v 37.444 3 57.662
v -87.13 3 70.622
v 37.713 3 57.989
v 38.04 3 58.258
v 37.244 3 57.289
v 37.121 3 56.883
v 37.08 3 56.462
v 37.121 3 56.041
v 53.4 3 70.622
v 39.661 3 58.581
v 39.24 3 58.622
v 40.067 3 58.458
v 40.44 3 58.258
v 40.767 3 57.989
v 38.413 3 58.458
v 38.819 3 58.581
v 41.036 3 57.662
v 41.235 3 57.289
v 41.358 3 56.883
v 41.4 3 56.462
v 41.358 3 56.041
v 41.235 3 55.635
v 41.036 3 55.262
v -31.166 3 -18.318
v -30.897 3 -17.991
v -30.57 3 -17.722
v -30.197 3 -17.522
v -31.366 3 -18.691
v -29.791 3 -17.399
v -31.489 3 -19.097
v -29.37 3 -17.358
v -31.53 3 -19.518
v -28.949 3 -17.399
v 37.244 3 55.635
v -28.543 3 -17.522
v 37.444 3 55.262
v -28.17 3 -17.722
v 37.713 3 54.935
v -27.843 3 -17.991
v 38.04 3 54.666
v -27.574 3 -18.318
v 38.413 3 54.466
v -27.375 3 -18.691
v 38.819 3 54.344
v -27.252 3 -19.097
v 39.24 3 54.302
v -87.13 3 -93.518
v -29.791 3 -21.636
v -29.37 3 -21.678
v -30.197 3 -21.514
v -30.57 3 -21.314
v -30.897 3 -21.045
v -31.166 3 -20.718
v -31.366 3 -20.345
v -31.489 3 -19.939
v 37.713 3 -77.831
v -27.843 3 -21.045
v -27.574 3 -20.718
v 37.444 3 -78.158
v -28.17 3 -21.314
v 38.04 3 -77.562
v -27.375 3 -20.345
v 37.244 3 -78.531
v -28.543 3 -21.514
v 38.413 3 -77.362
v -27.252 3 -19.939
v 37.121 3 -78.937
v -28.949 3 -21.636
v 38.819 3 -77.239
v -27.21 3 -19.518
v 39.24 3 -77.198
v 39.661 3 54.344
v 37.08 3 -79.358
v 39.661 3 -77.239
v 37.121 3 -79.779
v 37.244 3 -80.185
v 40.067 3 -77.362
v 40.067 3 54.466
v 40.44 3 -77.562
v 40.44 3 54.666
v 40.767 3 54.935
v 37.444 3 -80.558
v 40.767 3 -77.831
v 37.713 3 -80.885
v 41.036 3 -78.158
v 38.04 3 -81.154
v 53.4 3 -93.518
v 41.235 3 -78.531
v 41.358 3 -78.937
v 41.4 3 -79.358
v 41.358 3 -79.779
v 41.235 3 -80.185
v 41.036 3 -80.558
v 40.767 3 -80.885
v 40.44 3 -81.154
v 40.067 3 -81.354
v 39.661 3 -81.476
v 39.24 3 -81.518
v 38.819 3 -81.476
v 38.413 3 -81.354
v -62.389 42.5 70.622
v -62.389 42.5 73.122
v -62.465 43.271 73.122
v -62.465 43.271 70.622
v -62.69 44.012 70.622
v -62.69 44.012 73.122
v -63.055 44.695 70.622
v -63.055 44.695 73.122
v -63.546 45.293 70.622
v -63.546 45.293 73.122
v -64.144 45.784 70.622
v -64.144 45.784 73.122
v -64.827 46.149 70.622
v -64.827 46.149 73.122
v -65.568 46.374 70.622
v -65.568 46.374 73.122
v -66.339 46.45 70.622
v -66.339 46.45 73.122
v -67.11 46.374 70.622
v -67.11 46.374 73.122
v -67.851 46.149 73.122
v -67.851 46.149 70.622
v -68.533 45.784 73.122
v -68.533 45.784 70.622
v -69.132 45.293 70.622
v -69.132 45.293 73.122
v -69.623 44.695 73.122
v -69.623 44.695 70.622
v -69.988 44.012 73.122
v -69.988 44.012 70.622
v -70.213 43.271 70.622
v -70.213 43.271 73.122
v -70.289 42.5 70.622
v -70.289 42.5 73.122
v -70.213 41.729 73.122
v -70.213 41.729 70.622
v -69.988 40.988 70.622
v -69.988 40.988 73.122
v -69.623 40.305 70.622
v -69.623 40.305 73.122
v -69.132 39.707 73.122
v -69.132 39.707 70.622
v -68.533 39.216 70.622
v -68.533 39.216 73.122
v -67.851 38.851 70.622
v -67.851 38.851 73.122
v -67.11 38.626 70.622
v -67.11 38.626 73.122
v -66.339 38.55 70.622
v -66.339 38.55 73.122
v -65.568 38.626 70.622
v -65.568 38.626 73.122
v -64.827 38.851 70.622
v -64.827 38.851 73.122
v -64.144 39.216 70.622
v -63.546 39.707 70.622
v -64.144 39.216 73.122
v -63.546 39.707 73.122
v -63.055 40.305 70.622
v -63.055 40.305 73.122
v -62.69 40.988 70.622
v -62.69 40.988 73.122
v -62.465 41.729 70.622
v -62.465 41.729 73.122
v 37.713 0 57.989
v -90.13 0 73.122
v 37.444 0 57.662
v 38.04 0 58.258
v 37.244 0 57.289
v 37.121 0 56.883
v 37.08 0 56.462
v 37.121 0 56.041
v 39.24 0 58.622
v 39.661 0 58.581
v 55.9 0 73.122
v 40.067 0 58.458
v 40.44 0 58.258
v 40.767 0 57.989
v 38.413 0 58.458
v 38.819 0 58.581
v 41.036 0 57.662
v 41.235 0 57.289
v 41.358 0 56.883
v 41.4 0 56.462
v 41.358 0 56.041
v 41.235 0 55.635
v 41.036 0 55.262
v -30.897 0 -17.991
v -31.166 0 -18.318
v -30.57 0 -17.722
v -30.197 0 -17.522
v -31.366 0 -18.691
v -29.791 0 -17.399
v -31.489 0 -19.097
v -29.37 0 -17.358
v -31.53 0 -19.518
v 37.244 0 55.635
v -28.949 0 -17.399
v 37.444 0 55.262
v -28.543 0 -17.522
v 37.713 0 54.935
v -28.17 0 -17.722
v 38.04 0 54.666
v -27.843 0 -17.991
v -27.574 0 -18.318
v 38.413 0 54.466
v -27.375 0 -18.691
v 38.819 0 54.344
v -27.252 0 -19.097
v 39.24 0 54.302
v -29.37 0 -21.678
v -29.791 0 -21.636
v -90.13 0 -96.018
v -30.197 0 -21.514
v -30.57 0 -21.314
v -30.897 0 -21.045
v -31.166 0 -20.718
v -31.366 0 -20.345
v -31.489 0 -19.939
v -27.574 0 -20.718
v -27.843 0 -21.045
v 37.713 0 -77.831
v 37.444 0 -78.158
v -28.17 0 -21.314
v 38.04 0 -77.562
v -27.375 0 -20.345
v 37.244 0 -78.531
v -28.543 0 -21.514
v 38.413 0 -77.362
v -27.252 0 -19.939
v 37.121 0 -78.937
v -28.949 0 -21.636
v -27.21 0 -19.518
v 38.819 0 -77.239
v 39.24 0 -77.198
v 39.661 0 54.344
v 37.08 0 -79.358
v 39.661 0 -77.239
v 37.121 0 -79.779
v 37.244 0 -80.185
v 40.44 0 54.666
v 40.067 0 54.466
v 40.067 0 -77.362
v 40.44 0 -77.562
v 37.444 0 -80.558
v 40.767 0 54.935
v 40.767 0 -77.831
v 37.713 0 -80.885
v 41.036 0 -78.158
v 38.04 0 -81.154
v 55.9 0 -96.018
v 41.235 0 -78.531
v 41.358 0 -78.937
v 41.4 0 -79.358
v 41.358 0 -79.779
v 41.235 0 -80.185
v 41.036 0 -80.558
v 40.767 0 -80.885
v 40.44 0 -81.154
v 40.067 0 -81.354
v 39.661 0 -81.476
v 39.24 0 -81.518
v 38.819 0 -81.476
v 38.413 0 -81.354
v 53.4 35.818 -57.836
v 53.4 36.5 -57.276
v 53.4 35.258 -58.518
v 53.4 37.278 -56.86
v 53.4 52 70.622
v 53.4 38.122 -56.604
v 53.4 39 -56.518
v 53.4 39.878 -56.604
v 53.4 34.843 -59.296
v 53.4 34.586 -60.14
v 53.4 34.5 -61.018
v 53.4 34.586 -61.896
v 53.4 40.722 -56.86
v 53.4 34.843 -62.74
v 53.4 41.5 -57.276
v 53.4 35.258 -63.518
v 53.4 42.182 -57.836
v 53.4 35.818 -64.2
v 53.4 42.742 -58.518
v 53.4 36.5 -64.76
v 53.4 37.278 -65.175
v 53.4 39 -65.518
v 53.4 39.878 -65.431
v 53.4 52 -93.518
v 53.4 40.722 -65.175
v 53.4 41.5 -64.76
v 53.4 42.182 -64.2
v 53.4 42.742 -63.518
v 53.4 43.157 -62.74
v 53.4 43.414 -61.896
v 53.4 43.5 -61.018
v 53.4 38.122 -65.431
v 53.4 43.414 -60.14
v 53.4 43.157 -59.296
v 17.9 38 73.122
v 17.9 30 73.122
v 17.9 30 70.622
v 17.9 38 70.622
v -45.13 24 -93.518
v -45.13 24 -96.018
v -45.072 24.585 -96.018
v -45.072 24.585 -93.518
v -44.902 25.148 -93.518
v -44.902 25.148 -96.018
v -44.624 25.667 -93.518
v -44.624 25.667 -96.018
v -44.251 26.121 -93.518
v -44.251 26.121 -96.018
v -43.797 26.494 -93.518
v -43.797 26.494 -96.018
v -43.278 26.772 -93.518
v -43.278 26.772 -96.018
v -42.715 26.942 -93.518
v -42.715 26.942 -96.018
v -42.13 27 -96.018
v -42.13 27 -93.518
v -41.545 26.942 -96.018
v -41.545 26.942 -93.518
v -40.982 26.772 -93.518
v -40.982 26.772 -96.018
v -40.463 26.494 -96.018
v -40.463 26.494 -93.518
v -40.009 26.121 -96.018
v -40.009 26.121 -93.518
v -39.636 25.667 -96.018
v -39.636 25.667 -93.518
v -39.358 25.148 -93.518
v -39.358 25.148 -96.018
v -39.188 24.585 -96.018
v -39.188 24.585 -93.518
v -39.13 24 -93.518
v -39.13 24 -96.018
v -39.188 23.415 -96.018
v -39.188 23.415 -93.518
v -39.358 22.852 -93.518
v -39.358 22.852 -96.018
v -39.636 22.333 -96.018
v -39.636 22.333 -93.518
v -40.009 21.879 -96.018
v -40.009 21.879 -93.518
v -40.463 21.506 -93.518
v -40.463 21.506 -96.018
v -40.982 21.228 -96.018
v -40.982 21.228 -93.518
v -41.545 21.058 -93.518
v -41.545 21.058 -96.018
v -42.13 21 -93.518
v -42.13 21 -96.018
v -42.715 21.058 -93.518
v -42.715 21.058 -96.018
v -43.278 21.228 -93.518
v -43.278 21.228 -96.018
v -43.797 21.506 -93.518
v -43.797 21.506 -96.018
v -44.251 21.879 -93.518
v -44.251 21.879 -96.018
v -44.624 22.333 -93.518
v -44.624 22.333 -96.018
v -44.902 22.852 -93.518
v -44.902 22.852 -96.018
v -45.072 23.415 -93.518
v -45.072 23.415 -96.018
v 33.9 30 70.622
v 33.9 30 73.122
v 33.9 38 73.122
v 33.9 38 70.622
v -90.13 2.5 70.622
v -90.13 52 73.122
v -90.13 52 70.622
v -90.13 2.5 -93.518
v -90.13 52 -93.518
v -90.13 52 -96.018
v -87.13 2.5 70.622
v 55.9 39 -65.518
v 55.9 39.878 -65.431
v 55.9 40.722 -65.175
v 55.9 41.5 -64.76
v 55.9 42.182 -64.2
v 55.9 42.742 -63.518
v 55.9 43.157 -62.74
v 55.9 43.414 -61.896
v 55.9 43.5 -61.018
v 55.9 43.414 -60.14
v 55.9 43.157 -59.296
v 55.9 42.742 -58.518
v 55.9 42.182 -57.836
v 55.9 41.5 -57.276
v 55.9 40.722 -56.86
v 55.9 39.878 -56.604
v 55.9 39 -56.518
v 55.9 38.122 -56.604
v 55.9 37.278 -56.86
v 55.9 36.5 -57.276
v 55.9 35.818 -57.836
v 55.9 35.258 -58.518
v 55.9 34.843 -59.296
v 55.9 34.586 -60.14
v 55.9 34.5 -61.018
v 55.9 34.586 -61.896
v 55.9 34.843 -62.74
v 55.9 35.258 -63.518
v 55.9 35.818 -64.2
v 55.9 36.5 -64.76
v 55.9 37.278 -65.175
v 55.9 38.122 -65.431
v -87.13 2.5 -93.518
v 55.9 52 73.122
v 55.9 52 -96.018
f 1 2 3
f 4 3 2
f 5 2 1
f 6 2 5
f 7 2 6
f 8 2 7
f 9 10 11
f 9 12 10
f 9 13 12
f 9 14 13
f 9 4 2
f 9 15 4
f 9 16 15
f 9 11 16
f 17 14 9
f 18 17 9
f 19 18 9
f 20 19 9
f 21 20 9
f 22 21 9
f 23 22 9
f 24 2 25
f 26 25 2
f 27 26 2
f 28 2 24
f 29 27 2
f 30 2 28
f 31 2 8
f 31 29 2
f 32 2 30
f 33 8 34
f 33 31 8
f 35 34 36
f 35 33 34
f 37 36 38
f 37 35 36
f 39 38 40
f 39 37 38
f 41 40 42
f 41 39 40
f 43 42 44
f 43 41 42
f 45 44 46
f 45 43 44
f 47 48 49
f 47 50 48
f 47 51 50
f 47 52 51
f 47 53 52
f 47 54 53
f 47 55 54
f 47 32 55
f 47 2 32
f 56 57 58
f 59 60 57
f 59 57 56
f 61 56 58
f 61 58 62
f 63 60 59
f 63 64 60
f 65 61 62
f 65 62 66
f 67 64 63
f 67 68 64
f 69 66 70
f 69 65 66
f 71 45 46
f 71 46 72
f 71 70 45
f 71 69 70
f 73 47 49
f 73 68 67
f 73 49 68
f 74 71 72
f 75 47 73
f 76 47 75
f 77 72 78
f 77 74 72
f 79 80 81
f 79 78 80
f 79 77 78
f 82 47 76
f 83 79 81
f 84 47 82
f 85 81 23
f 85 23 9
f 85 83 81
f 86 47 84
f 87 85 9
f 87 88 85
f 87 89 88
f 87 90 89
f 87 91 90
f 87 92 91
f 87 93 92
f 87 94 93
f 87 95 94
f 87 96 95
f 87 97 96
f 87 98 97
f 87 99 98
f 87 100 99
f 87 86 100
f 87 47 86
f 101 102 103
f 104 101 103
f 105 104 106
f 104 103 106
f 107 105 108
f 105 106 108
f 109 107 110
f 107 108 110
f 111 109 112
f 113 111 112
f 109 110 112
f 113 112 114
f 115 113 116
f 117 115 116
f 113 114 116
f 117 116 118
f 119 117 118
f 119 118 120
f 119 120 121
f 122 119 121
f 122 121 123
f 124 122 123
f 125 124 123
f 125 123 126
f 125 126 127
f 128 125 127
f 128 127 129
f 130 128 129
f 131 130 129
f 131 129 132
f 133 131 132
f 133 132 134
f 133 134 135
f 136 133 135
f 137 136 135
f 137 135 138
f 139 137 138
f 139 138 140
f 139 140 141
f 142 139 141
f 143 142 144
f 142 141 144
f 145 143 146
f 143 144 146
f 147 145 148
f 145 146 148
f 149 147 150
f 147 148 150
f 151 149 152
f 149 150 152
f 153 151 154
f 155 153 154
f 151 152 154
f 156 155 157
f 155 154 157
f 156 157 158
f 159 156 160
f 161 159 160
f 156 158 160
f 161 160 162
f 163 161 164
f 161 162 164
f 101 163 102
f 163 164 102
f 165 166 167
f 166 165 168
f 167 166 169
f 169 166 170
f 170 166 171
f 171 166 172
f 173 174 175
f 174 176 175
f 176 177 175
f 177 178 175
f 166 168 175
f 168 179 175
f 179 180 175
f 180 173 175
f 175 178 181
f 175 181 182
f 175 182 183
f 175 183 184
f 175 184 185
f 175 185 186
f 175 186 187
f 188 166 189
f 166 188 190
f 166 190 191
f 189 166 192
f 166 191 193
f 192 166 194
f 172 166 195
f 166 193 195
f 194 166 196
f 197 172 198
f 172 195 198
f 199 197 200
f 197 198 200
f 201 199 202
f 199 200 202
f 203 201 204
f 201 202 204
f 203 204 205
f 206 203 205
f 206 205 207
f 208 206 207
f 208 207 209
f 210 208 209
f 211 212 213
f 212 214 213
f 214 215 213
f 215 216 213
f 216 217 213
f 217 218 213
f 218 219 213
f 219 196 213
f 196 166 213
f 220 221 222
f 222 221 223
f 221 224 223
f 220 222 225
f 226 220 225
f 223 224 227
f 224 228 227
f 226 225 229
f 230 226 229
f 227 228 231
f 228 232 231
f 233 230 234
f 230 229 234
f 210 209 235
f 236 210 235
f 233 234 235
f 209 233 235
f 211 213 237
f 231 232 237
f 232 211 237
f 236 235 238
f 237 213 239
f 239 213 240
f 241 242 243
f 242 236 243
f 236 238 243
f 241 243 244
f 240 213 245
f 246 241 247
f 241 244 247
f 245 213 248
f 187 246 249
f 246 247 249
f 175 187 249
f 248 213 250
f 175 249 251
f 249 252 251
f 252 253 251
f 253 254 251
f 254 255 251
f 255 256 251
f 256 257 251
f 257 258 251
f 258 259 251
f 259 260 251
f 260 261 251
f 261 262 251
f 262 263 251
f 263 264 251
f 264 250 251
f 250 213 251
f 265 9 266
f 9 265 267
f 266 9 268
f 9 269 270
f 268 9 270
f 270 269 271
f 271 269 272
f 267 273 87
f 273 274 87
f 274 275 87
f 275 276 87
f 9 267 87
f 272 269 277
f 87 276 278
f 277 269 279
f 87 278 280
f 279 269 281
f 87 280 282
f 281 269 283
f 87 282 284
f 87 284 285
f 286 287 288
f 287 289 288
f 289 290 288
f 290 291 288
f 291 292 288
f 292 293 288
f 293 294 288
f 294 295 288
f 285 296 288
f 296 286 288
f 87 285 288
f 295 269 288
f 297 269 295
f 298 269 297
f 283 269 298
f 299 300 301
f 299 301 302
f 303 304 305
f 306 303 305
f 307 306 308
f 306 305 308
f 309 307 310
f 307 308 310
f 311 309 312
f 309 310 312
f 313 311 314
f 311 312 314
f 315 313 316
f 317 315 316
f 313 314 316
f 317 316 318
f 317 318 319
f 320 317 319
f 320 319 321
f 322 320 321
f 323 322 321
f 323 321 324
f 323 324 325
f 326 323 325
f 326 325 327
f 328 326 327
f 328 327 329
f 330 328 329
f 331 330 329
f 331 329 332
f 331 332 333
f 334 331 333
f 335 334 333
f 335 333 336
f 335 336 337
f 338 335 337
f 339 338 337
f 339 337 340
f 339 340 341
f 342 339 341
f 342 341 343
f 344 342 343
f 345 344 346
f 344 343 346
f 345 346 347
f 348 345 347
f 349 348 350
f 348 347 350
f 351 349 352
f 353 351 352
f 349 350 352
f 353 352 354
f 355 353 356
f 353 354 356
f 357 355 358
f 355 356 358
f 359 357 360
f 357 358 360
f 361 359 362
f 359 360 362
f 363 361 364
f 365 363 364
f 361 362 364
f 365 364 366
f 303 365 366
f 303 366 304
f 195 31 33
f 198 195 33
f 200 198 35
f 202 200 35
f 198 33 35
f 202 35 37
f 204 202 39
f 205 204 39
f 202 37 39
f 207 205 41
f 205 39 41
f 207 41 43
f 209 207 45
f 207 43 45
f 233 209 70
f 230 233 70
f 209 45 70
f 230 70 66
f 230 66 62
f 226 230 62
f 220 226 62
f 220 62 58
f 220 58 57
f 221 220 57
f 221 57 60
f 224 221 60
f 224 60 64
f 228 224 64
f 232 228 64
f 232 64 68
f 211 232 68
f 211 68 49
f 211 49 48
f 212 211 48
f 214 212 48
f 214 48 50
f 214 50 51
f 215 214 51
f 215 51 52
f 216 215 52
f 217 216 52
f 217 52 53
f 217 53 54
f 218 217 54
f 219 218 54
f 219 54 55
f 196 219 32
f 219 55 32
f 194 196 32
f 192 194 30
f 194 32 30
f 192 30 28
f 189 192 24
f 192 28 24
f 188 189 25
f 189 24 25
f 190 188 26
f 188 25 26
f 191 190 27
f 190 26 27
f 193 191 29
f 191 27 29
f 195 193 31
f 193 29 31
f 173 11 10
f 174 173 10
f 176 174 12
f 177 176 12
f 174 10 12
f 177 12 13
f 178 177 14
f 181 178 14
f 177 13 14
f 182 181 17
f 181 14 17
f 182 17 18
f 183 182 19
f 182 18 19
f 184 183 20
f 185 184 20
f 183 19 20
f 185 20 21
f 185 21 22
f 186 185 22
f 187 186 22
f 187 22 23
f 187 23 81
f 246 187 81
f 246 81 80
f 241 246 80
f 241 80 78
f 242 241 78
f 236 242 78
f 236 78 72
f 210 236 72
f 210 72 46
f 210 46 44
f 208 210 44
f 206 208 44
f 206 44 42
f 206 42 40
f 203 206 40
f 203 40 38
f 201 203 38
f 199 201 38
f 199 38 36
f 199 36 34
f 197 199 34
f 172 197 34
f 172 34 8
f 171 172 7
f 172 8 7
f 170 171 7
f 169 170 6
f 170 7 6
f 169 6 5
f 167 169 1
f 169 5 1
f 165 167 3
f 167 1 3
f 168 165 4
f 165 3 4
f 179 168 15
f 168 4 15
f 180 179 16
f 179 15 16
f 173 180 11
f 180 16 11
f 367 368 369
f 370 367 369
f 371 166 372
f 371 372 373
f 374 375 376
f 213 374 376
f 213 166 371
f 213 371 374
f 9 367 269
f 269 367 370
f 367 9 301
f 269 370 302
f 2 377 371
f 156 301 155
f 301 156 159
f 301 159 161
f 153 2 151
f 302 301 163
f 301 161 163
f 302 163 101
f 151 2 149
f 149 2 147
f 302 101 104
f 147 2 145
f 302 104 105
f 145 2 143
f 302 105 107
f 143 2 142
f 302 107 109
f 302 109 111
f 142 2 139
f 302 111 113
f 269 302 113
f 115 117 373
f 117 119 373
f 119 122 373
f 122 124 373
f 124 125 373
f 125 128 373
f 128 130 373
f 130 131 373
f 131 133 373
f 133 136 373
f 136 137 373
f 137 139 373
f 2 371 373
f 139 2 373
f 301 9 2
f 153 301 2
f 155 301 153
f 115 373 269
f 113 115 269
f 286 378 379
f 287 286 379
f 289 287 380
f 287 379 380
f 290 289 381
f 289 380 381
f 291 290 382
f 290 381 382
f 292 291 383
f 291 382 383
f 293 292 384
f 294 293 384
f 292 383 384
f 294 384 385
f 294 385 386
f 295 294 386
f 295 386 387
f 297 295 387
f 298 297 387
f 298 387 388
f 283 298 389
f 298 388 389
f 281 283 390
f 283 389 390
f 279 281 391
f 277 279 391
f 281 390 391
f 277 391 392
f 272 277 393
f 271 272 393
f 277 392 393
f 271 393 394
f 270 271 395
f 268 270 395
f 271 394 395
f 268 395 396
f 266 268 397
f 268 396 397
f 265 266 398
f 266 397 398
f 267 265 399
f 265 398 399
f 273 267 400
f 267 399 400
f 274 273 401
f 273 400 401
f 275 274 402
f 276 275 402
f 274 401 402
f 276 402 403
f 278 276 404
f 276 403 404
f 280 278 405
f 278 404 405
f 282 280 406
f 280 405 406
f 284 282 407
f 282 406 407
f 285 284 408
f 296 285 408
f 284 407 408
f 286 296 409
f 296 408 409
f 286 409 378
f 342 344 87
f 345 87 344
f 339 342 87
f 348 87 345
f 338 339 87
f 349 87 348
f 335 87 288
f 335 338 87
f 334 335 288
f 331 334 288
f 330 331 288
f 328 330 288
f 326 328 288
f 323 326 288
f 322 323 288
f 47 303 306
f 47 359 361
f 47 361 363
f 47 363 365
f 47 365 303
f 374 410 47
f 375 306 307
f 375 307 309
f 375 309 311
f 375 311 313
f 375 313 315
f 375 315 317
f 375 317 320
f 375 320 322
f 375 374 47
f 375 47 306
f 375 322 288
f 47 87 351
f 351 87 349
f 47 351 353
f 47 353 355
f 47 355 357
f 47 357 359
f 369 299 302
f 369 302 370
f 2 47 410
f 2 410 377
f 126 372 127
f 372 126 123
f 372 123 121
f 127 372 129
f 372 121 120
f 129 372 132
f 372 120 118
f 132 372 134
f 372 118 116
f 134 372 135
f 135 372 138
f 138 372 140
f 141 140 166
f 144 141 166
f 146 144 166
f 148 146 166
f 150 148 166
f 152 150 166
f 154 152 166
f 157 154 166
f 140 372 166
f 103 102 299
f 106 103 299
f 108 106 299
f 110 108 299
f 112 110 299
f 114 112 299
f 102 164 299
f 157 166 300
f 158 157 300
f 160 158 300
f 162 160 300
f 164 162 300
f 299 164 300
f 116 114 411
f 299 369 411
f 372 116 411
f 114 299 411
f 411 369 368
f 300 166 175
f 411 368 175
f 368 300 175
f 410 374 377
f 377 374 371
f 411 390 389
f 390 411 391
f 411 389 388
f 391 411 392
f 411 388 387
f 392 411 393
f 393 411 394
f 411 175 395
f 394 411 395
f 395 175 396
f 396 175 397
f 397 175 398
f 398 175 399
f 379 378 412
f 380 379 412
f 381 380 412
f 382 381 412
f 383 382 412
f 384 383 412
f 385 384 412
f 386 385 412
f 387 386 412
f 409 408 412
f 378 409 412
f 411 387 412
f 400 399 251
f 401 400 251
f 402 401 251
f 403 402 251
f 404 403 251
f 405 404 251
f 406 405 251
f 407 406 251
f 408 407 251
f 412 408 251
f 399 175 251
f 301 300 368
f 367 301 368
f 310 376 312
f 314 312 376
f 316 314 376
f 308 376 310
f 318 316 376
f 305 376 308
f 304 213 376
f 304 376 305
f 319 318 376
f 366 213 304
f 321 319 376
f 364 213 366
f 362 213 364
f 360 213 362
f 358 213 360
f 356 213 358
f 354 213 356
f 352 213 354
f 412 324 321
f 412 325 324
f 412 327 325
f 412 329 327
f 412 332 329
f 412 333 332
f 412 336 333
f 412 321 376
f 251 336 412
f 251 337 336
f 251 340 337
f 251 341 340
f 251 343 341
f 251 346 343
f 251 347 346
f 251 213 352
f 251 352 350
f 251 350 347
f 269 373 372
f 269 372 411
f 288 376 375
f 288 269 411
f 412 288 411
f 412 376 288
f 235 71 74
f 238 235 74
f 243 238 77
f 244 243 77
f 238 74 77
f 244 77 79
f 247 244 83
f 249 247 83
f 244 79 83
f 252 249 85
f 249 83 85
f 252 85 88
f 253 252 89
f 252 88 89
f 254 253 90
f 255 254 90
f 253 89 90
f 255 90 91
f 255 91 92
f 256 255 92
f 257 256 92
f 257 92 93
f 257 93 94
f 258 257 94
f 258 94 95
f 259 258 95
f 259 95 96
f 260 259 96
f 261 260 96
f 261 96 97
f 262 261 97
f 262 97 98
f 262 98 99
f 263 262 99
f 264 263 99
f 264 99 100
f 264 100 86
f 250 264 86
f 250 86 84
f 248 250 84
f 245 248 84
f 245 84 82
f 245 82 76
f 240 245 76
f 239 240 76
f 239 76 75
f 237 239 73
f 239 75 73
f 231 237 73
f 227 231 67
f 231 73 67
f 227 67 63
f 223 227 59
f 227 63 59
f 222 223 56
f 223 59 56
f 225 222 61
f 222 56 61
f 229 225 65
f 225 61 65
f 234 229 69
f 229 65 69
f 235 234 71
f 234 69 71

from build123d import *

# Parameters (mm, degrees)
SKETCH1_W           = 146.03
SKETCH1_H           = 169.14
BOSS_EXTRUDE2_DEPTH = 52
SKETCH6_W           = 141.03
SKETCH6_H           = 164.14
CUT_EXTRUDE3_DEPTH  = 49
SKETCH7_R           = 2.16
CUT_EXTRUDE4_DEPTH  = 50
SKETCH8_R           = 4.5
CUT_EXTRUDE5_DEPTH  = 2.5
SKETCH9_W           = 16
SKETCH9_H           = 8
CUT_EXTRUDE6_DEPTH  = 3
SKETCH12_W          = 164.14
SKETCH12_H          = 49.5
CUT_EXTRUDE9_DEPTH  = 3
SKETCH13_R          = 3.95
CUT_EXTRUDE10_DEPTH = 3
SKETCH14_R          = 3
CUT_EXTRUDE11_DEPTH = 3


with BuildPart() as part:
    # Sketch1 → Boss-Extrude2 (new body)
    with BuildSketch(Plane(origin=(0, 0, 0), x_dir=(1, 0, 0), z_dir=(0, 1, 0))):
        with Locations((-17.115088028, 11.447931338)):
            Rectangle(SKETCH1_W, SKETCH1_H)
    extrude(amount=BOSS_EXTRUDE2_DEPTH)

    # Sketch6 → Cut-Extrude3 (cut)
    with BuildSketch(Plane(origin=(0, 52, 0), x_dir=(1, 0, 0), z_dir=(0, 1, 0))):
        with Locations((-17.115088028, 11.447931338)):
            Rectangle(SKETCH6_W, SKETCH6_H)
    extrude(amount=-CUT_EXTRUDE3_DEPTH, mode=Mode.SUBTRACT)

    # Sketch7 → Cut-Extrude4 (cut)
    with BuildSketch(Plane(origin=(0, 3, 0), x_dir=(1, 0, 0), z_dir=(0, 1, 0))):
        with Locations(Location((39.239911972, -56.462068662, 0), (0, 0, 270))):
            Circle(SKETCH7_R)
        with Locations(Location((39.239911972, 79.357931338, 0), (0, 0, 270))):
            Circle(SKETCH7_R)
        with Locations(Location((-29.370088028, 19.517931338, 0), (0, 0, 270))):
            Circle(SKETCH7_R)
    extrude(amount=-CUT_EXTRUDE4_DEPTH, mode=Mode.SUBTRACT)

    # Sketch8 → Cut-Extrude5 (cut)
    with BuildSketch(Plane(origin=(55.899911972, 0, 0), x_dir=(0, 0, -1), z_dir=(1, 0, 0))):
        with Locations((61.017931338, 39)):
            Circle(SKETCH8_R)
    extrude(amount=-CUT_EXTRUDE5_DEPTH, mode=Mode.SUBTRACT)

    # Sketch9 → Cut-Extrude6 (cut)
    with BuildSketch(Plane.XY.offset(73.122068662)):
        with Locations((25.899911972, 34)):
            Rectangle(SKETCH9_W, SKETCH9_H)
    extrude(amount=-CUT_EXTRUDE6_DEPTH, mode=Mode.SUBTRACT)

    # Sketch12 → Cut-Extrude9 (cut)
    with BuildSketch(Plane.ZY.offset(90.130088028)):
        with Locations((-11.447931338, 27.25)):
            Rectangle(SKETCH12_W, SKETCH12_H)
    extrude(amount=-CUT_EXTRUDE9_DEPTH, mode=Mode.SUBTRACT)

    # Sketch13 → Cut-Extrude10 (cut)
    with BuildSketch(Plane.XY.offset(73.122068662)):
        with Locations((-66.33891095, 42.5)):
            Circle(SKETCH13_R)
    extrude(amount=-CUT_EXTRUDE10_DEPTH, mode=Mode.SUBTRACT)

    # Sketch14 → Cut-Extrude11 (cut)
    with BuildSketch(Plane(origin=(0, 0, -96.017931338), x_dir=(-1, 0, 0), z_dir=(0, 0, -1))):
        with Locations((42.130088028, 24)):
            Circle(SKETCH14_R)
    extrude(amount=-CUT_EXTRUDE11_DEPTH, mode=Mode.SUBTRACT)


solid = part.part
